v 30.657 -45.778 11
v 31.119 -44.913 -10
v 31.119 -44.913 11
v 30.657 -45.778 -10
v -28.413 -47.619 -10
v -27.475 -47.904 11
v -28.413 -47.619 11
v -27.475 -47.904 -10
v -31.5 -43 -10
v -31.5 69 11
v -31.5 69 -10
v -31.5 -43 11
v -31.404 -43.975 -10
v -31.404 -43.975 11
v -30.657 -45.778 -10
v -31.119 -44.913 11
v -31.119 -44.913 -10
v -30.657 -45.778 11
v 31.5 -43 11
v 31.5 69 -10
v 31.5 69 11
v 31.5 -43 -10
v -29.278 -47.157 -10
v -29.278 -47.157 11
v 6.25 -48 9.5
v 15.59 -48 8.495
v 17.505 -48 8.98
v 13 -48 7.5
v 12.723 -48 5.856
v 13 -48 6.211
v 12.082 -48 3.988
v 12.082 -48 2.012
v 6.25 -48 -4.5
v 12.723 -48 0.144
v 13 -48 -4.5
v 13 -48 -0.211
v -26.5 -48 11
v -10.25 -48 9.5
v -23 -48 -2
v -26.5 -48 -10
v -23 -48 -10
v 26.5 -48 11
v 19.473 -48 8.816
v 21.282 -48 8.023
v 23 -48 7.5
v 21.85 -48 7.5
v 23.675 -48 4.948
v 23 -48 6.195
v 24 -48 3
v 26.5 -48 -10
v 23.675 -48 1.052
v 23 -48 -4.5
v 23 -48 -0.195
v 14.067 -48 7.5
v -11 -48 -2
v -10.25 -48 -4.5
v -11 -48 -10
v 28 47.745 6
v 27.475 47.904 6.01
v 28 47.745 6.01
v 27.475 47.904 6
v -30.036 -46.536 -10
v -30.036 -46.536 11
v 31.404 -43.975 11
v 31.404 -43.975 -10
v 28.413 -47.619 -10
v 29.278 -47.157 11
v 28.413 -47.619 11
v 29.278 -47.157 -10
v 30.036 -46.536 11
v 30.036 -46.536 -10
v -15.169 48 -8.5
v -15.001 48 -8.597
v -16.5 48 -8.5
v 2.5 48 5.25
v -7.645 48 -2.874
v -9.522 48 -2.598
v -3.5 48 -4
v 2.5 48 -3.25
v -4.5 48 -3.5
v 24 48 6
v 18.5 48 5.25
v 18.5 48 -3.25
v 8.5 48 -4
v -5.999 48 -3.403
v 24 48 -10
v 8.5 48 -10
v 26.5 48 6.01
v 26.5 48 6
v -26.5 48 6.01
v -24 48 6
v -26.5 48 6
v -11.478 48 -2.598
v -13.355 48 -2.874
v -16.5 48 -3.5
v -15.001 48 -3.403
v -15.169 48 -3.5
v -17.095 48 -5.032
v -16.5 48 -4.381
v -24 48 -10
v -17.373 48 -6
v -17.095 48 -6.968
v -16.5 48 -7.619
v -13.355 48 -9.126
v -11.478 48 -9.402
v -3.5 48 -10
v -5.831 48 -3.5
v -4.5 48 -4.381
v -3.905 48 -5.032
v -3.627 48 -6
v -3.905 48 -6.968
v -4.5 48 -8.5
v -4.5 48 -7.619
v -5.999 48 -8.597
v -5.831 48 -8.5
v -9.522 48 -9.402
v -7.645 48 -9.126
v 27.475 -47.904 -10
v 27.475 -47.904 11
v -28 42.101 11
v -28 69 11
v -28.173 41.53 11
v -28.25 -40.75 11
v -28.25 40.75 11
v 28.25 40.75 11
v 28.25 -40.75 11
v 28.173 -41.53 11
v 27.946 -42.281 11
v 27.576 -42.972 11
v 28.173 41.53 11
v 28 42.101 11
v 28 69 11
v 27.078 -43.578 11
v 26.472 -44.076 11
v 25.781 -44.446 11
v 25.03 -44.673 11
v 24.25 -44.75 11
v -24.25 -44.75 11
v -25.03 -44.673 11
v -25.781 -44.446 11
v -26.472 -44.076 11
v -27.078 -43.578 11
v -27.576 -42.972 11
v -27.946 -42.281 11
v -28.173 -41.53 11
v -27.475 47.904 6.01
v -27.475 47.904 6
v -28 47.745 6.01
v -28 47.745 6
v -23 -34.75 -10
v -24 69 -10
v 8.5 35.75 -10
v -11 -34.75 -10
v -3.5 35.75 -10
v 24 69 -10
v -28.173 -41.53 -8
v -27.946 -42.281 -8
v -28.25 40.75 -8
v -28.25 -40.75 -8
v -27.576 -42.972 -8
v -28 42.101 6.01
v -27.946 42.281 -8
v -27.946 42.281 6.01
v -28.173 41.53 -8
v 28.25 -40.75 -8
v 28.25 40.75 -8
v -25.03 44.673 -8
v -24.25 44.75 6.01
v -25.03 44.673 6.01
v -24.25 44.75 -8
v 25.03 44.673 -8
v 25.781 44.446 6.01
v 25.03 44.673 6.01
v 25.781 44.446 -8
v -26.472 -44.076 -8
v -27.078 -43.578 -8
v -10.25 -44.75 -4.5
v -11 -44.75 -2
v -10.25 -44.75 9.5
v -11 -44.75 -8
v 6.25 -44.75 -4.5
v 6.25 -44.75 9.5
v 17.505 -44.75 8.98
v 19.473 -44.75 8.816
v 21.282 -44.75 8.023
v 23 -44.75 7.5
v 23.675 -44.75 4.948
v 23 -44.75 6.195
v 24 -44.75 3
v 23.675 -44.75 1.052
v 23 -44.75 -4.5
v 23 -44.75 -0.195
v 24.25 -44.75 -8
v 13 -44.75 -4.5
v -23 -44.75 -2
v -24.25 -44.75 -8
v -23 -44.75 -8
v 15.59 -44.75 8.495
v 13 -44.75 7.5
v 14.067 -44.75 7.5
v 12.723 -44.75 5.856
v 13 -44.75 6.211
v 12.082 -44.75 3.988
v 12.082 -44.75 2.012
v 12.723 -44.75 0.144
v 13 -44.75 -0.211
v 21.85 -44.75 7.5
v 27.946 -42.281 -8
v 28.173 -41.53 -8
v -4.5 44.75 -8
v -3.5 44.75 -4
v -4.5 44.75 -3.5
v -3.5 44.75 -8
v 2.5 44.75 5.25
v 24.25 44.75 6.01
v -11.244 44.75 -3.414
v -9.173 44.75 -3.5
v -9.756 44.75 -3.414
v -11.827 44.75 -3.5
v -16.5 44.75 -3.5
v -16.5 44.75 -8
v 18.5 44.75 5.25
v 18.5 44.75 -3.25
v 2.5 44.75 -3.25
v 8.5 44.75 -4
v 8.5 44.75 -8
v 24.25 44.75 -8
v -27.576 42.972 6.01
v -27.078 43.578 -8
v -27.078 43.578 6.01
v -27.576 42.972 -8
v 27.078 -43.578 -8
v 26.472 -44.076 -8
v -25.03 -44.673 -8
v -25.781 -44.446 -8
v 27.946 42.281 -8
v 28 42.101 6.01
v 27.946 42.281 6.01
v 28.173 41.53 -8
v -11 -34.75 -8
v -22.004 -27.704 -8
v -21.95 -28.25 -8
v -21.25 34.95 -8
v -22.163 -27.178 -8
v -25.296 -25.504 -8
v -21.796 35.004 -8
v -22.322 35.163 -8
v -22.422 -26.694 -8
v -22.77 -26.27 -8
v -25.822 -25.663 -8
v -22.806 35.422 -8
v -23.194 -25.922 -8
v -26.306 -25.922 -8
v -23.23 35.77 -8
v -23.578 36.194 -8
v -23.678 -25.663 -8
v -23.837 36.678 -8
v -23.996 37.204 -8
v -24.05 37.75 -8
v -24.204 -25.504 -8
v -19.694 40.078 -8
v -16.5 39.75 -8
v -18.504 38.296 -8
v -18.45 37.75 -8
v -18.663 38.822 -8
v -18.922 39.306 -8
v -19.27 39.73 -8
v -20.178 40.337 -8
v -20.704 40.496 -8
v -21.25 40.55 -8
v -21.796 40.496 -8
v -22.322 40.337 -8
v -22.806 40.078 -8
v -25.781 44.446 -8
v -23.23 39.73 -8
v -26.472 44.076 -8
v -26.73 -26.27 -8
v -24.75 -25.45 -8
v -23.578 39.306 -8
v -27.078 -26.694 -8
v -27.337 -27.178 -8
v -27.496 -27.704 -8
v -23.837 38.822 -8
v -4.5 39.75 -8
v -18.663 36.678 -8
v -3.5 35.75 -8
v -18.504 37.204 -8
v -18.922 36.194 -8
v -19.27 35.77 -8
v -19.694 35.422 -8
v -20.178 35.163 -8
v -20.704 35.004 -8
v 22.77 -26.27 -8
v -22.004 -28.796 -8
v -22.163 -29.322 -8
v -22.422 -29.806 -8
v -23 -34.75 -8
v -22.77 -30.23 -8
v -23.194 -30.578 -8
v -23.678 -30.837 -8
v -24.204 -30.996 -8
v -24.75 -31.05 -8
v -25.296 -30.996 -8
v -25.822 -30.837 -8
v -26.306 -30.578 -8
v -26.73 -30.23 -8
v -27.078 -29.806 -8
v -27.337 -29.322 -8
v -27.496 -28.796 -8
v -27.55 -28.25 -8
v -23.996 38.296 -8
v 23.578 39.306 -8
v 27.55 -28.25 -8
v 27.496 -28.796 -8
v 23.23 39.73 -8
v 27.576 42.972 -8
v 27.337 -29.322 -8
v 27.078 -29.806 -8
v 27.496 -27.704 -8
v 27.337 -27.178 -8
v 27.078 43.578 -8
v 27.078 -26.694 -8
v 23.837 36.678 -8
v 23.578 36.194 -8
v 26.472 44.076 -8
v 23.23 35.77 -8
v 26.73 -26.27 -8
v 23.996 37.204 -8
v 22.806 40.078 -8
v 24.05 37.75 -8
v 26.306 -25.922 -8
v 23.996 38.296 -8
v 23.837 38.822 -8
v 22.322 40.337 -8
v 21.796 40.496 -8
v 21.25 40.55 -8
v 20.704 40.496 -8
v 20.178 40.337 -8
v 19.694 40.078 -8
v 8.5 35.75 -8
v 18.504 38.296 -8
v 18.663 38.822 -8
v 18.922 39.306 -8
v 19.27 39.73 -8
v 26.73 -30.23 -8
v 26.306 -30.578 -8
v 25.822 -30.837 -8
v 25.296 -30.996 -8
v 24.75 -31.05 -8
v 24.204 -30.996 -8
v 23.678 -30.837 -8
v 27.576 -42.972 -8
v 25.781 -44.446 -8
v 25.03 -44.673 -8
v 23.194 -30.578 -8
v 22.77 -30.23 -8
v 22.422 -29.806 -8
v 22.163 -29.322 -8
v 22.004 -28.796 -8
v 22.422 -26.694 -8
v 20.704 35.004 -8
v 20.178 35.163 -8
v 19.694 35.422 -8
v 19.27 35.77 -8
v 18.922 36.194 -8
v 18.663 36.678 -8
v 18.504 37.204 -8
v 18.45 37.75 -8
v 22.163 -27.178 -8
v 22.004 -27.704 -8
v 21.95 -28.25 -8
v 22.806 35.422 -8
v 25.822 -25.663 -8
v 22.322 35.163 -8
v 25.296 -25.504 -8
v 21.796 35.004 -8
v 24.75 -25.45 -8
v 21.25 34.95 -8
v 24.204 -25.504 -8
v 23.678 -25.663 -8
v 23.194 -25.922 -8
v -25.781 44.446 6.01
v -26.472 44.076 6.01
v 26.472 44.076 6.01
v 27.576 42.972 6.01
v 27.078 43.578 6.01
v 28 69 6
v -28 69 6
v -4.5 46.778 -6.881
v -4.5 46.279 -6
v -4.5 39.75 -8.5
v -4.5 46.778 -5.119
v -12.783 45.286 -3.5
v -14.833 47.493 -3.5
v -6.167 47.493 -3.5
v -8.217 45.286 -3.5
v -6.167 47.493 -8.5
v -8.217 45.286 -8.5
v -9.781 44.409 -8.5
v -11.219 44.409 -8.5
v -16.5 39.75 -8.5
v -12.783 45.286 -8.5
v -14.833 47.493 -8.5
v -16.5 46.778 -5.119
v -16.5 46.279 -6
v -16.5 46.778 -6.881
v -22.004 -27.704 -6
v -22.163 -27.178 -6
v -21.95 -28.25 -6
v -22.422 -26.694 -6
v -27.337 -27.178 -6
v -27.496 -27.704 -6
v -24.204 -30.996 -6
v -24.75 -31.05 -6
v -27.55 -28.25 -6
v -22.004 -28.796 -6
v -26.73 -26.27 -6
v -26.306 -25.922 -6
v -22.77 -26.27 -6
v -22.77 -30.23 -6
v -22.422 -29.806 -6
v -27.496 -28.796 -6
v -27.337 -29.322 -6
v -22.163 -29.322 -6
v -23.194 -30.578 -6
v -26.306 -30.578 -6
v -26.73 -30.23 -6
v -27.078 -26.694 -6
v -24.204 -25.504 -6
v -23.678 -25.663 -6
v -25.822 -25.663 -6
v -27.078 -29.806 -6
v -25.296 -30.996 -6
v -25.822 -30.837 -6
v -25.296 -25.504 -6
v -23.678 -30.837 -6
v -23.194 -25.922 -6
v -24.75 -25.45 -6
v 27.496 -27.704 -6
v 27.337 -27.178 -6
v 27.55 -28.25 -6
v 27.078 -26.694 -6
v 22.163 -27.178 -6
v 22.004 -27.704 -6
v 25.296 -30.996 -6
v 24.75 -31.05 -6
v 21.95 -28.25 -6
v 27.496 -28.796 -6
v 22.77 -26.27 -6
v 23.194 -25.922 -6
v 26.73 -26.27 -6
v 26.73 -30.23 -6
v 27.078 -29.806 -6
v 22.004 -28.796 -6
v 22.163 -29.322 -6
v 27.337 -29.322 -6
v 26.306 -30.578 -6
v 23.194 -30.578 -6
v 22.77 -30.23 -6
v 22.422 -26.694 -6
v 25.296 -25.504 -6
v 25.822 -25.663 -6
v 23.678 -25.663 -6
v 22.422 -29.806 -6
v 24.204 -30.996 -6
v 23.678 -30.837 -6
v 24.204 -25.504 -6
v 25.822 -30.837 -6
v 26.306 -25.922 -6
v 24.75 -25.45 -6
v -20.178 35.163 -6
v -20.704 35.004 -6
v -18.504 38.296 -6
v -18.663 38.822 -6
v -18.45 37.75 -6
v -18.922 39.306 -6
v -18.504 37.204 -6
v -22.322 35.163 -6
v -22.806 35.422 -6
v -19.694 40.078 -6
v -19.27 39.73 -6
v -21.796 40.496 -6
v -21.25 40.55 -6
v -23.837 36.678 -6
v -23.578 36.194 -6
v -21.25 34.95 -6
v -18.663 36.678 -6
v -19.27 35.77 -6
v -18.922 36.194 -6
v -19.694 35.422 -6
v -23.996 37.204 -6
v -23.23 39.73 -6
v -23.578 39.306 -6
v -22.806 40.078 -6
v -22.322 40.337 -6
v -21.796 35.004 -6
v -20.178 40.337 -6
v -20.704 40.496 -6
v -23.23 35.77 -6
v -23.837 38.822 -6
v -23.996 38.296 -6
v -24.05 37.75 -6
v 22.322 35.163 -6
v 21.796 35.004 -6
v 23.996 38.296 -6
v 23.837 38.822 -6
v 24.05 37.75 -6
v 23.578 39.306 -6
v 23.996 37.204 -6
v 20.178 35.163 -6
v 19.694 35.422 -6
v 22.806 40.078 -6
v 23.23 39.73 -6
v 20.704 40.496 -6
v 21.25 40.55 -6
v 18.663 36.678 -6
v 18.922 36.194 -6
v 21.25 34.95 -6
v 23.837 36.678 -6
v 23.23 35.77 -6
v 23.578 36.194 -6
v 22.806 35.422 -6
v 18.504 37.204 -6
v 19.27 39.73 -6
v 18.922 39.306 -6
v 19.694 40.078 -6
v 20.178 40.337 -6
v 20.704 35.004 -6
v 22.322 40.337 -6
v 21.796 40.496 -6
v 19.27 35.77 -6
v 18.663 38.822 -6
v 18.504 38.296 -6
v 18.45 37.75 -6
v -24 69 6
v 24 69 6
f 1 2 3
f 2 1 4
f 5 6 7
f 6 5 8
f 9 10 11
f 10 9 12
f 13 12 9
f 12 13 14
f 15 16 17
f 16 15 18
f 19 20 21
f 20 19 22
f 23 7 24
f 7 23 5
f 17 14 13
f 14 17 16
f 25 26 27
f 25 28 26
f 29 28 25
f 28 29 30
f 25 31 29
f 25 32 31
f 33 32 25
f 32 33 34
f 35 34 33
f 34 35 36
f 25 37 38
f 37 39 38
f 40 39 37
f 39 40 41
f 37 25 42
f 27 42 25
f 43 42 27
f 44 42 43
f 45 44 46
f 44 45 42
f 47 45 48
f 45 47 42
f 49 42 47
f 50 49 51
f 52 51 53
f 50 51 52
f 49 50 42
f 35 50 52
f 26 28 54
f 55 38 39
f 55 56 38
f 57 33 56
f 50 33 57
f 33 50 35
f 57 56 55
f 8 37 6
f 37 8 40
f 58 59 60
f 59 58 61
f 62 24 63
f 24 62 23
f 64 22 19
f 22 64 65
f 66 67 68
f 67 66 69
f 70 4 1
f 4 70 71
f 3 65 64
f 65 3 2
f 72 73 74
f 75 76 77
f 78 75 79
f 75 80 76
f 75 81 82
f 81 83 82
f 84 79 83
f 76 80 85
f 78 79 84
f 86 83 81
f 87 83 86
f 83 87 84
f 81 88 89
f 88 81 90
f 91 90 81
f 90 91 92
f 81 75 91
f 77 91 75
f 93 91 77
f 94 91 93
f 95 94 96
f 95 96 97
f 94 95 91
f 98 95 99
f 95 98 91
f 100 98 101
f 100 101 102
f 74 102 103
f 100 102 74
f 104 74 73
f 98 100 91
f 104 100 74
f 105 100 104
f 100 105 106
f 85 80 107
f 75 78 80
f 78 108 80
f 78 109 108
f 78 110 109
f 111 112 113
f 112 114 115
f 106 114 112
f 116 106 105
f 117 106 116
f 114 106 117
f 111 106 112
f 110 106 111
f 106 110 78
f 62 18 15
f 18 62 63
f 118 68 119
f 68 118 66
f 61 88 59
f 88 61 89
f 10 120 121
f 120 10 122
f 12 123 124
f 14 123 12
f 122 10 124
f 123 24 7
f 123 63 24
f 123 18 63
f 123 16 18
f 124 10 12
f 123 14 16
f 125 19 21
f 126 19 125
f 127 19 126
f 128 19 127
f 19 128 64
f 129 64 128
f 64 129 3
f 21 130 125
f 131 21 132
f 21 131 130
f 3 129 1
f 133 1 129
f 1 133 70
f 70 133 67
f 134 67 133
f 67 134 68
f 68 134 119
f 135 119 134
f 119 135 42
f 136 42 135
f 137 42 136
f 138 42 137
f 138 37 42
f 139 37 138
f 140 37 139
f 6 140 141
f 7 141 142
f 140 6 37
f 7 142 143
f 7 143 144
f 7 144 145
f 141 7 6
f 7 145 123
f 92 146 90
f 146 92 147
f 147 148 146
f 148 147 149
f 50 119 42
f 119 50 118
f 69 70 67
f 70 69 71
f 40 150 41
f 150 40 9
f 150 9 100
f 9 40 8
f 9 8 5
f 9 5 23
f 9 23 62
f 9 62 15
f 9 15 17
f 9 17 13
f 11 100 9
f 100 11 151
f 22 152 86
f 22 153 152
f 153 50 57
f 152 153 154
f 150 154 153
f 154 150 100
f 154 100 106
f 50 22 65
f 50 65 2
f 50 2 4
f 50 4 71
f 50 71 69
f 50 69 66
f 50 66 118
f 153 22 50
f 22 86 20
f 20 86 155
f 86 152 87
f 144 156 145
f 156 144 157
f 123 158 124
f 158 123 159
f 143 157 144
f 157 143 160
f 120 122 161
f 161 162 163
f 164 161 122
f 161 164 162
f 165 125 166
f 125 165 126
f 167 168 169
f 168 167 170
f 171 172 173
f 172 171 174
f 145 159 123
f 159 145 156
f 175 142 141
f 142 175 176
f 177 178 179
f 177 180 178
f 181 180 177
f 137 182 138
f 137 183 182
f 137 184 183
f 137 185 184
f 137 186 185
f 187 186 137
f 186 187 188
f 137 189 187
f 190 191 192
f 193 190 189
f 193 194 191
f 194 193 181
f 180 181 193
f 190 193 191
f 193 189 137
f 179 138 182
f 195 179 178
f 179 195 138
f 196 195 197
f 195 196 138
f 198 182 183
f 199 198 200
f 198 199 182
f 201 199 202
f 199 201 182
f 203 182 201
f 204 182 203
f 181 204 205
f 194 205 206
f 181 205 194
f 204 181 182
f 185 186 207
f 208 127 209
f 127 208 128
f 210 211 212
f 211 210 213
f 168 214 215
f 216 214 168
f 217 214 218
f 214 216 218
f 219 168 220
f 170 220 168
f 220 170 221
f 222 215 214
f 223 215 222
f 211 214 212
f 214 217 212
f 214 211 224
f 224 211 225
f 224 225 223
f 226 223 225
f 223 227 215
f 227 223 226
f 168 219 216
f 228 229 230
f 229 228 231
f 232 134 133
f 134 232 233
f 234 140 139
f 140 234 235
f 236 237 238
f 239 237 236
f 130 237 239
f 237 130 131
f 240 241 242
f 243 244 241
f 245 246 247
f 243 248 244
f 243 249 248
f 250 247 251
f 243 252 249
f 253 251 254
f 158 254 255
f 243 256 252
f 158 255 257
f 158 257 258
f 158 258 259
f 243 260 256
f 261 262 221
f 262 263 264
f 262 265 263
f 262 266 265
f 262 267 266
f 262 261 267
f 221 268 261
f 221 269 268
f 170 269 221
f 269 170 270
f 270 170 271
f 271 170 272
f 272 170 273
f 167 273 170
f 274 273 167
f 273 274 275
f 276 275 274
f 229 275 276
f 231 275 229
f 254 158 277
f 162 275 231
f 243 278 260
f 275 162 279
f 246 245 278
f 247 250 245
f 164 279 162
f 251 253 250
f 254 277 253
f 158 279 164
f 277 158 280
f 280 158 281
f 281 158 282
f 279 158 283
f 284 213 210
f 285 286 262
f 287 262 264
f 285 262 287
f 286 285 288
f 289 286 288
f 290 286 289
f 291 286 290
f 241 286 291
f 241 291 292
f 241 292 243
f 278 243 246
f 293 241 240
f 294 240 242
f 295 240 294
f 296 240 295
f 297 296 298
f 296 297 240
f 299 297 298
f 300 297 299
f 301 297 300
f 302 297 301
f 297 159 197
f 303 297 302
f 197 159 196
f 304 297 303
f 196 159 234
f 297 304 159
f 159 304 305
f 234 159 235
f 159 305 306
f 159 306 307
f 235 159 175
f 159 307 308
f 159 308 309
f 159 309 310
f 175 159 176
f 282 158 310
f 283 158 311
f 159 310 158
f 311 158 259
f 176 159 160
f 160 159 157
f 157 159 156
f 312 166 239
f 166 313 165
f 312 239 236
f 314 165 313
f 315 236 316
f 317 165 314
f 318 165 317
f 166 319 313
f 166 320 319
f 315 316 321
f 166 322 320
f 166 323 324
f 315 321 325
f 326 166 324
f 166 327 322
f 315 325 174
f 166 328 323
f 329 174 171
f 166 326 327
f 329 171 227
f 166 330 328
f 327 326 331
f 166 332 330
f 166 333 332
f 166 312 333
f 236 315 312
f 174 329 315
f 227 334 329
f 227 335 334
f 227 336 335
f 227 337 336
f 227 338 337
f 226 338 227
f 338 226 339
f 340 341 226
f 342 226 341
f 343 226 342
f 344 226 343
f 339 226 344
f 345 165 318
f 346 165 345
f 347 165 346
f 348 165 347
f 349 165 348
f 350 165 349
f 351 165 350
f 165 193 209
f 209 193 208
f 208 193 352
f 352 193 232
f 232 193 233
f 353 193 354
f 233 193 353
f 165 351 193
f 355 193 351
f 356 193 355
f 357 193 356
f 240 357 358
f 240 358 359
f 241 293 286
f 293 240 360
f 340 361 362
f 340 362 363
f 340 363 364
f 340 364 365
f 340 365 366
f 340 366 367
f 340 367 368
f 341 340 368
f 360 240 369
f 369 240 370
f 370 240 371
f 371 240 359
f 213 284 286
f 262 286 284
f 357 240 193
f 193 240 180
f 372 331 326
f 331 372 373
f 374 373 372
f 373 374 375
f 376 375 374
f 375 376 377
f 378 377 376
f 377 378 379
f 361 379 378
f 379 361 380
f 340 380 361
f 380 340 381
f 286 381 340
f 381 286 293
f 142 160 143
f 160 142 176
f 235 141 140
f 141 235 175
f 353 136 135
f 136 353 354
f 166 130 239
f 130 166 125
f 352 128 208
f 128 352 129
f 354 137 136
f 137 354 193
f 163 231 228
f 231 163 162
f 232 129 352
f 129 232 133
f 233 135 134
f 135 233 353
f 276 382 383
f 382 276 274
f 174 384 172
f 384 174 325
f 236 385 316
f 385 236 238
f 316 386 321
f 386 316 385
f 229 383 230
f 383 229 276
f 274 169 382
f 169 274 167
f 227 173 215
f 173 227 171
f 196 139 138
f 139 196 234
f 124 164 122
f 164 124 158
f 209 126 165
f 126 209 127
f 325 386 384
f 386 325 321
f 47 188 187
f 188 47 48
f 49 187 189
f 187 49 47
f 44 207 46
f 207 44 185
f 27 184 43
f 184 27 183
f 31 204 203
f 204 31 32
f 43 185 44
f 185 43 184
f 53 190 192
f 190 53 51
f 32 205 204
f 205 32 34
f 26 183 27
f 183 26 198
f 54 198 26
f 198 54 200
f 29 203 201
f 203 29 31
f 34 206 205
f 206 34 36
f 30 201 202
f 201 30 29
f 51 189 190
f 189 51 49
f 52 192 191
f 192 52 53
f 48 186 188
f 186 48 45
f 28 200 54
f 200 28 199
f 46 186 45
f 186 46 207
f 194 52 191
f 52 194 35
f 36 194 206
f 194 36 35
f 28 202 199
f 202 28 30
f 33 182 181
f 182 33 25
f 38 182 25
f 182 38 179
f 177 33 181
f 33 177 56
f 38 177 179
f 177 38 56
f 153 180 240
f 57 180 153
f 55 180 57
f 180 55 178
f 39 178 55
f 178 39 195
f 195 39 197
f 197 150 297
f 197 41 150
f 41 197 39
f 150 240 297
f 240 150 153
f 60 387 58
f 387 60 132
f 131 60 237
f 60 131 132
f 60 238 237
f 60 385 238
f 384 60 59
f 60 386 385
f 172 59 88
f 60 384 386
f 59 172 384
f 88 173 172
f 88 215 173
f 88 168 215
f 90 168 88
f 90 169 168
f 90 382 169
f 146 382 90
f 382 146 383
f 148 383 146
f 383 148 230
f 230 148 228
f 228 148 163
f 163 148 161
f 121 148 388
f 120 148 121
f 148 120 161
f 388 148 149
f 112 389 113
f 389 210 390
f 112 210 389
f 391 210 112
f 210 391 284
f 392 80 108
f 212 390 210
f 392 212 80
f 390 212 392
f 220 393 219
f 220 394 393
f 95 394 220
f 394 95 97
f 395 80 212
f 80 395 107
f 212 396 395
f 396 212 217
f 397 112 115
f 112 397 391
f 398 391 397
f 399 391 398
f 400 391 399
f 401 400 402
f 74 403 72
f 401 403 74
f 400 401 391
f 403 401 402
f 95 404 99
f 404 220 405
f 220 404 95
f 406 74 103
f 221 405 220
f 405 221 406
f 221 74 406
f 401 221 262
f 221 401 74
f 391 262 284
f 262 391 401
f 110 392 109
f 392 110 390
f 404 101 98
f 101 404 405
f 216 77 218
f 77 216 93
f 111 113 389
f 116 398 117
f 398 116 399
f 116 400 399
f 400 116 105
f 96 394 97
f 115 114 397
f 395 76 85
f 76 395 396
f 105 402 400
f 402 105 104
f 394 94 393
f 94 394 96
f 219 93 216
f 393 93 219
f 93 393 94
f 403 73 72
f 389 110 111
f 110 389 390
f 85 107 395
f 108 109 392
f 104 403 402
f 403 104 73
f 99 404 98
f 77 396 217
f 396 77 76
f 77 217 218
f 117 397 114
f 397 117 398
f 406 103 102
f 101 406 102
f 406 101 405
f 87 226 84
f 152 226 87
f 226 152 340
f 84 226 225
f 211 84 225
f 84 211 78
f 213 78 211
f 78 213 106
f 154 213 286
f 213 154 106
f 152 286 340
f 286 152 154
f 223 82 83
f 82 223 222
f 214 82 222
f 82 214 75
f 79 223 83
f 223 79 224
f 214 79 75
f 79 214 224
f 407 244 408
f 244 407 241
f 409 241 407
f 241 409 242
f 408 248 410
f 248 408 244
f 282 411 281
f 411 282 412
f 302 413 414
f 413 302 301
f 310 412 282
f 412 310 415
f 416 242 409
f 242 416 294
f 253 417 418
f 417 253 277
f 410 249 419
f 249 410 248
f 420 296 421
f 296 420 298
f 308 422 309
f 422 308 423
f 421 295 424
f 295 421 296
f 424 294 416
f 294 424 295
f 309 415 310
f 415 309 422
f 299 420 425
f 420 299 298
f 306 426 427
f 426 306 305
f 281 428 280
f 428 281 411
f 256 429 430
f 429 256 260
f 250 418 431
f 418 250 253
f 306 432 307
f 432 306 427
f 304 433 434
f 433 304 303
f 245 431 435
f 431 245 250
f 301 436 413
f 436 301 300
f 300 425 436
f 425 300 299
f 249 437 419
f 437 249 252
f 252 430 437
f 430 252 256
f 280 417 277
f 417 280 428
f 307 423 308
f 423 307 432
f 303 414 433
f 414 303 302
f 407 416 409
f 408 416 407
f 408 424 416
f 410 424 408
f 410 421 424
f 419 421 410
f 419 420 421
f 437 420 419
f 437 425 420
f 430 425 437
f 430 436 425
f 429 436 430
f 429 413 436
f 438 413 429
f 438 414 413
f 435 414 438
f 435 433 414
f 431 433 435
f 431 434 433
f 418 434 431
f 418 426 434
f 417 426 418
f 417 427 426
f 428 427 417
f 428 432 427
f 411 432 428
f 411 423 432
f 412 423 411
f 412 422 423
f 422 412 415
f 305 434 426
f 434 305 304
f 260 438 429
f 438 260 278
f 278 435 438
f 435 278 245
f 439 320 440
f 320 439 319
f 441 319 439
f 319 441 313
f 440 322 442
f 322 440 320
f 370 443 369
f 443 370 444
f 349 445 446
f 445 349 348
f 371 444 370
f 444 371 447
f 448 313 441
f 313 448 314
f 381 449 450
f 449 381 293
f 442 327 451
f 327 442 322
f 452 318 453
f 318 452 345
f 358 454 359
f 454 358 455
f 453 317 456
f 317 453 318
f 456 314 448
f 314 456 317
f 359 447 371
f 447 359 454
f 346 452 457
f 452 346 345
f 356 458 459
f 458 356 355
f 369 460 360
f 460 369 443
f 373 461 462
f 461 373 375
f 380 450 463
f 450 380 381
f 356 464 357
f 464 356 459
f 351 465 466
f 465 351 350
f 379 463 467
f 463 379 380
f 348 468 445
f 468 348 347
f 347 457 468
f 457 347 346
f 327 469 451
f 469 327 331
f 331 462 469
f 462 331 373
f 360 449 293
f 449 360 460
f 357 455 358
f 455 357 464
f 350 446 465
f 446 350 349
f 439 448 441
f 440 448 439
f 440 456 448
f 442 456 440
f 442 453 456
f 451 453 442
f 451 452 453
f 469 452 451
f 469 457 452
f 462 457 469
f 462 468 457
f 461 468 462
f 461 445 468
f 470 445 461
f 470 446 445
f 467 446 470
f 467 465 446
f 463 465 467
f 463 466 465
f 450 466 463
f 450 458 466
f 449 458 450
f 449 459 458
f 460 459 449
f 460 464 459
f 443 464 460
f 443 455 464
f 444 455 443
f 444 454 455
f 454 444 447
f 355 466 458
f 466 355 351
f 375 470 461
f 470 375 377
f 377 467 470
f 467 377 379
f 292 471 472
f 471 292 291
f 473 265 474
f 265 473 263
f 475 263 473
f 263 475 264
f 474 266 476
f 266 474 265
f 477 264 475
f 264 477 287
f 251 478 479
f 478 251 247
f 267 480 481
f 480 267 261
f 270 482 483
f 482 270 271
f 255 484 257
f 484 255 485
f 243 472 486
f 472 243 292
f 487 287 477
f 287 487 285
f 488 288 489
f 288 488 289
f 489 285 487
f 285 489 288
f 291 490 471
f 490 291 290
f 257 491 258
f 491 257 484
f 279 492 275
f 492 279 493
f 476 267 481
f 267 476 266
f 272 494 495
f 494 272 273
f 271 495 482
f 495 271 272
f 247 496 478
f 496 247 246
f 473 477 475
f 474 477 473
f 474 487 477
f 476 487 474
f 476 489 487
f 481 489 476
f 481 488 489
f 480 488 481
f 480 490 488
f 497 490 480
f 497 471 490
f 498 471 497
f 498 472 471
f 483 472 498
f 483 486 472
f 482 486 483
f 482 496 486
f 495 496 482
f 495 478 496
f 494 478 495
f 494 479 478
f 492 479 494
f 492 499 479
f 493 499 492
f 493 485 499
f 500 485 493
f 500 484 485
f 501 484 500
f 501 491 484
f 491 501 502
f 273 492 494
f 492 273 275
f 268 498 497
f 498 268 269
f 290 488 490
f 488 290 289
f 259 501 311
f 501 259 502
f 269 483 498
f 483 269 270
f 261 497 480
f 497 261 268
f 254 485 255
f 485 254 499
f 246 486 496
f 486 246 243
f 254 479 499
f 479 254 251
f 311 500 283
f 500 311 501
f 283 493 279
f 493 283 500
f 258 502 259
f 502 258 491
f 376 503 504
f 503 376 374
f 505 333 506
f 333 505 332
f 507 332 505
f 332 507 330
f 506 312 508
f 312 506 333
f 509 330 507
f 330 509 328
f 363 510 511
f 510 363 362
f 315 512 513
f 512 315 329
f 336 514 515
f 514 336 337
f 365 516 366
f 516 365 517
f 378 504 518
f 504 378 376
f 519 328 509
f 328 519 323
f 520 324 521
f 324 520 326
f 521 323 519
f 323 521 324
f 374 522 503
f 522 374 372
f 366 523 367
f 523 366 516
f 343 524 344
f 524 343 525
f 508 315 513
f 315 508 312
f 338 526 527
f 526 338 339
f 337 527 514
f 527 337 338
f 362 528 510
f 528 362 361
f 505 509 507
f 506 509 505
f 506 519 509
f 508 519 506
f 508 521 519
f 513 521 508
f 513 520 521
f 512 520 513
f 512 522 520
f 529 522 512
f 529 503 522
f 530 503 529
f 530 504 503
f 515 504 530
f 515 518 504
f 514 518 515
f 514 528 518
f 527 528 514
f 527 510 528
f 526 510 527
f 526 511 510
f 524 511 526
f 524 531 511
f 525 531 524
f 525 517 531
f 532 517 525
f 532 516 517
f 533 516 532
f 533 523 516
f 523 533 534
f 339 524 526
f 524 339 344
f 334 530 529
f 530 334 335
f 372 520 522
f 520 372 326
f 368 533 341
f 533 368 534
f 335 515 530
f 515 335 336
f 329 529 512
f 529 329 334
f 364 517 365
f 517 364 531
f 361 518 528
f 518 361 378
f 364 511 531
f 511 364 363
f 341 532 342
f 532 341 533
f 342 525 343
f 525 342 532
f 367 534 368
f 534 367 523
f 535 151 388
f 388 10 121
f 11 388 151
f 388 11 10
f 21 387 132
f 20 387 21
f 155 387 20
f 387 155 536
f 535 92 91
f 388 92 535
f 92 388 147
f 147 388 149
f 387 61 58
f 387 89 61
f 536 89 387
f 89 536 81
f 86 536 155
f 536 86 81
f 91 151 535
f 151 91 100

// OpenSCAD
wall_thickness=6.5;
base_thickness=2.0;
bb_depth=20;
bb_width=56.5;
bb_height=89.5;
bb_curve_corner=10;

peg_pow_front=16.5;
peg_pow_side=3.5;

peg_sd_front=7;
peg_sd_side=7;

peg_outer_radius=2.8;
peg_inner_radius=2.0;

module RoundedBB(extra_width,extra_height,depth,curve=bb_curve_corner) {
     minkowski() {
          cube([bb_width-curve+extra_width,bb_height-curve+extra_height,depth],center=true);
          cylinder(r=curve/2, height=depth, $fn=32);
     }
   //  translate([0,55+2.5,0.5])
   //   cube([bb_width+wall_thickness,23,bb_depth+1],center=true);
}

module BeagleBox(curve=bb_curve_corner) {
     difference() {
          RoundedBB(wall_thickness, wall_thickness, bb_depth, curve);
          translate([0,0,base_thickness])
               RoundedBB(0, 0, bb_depth, curve-2);
     }
}

difference() {
     union() {

          difference() {

               BeagleBox();

               translate([0,0,-bb_depth/2+9]) {
                    // -- Bottom End --

                    // Power connector
                    %				translate([18,-bb_height/2,2.5])
                         cube([10,10,12],center=true);
                    translate( [18,-45,4] )
                         rotate( [90,0,0] )
                         cylinder( r=6, h=9, center=true );
                    translate([18,-bb_height/2,2.5])
                         cube([10,10,12],center=true);
                    // Ethernet port
                    translate([-2,-bb_height/2,3.5])
                         cube([16.5,10,14],center=true);

                    // Mini USB (Underneath)
                    // translate([-23,-bb_height/2-5,-16])     // protruding
                    // translate([-23,-bb_height/2,-9+0.334])  // thin layer underneath
                    //	cube([10,12,base_thickness-0.3333]);
                    translate([-23,-bb_height/2-10,-10])
                         cube([12,20,9]);
                    // original mini USB, doesn't fit cable
                    %				translate([-22,-bb_height/2-10,-12])
                                         cube([10,20,8]);

                    // -- Top reduction Damian--
                    translate([-56/2,35,8.01-1])
                            cube([56,20,17-12]);



                    // SD Card slot
                    translate([-6.5-4,bb_height/2,-5.0])
                         cube([12,10,5], center=true); // was 3 in z
                    // Original SD slot
                    %				translate([-6.5,bb_height/2,-5.5])
                                         cube([12,10,2], center=true);
                    // thumb depression for inserting card
                    translate([-6.5-4,bb_height/2+3.5,-5.0])
                         scale( [1,2.3,0.5] )
                         rotate( [90,0,0] )
                         cylinder( r1=7, r2=0, h=6 );
                    // HDMI port
                    translate([-6.5+3.0,bb_height/2-9,-12.0])
                         cube([12,20,9]);
                    // USB port
                    translate([10.5,bb_height/2,2.0])
                         cube([16,10,8.5],center=true);
               }
          }

          // Pegs
          translate([0,0,-bb_depth/2+9]) {
               // Pegs on "power" end
               translate([-bb_width/2+peg_pow_side,-bb_height/2+peg_pow_front,-6])
                    cylinder(r=peg_outer_radius,h=2,$fn=32,center=true);
               translate([bb_width/2-peg_pow_side,-bb_height/2+peg_pow_front,-6])
                    cylinder(r=peg_outer_radius,h=2,$fn=32,center=true);

               // Pegs on "sd card" end
               translate([-bb_width/2+peg_sd_side,bb_height/2-peg_sd_front,-6])
                    cylinder(r=peg_outer_radius,h=2,$fn=32,center=true);
               translate([bb_width/2-peg_sd_side,bb_height/2-peg_sd_front,-6])
                    cylinder(r=peg_outer_radius,h=2,$fn=32,center=true);
          }
     }

     // Drill holes through pegs and floor
//	translate([0,0,-bb_depth/2+9]) {
     // Pegs on "power" end
//		translate([-bb_width/2+peg_pow_side,-bb_height/2+peg_pow_front,-5])
//			cylinder(r=peg_inner_radius,h=10,$fn=32,center=true);
//		translate([bb_width/2-peg_pow_side,-bb_height/2+peg_pow_front,-5])
//			cylinder(r=peg_inner_radius,h=10,$fn=32,center=true);

     // Pegs on "sd card" end
//		translate([-bb_width/2+peg_sd_side,bb_height/2-peg_sd_front,-5])
//			cylinder(r=peg_inner_radius,h=10,$fn=32,center=true);
//		translate([bb_width/2-peg_sd_side,bb_height/2-peg_sd_front,-5])
//			cylinder(r=peg_inner_radius,h=10,$fn=32,center=true);
//	}
}



difference(){
     union(){
          translate([0,55+2.5,0.5])
               cube([bb_width+wall_thickness,23,bb_depth+1],center=true);

          // correcion de las paredes
          translate([bb_width/2+wall_thickness/2-1.5,40,0.5])
               cube([3,23,bb_depth+1],center=true);

          translate([-bb_width/2-wall_thickness/2+1.5,40,0.5])
               cube([3,23,bb_depth+1],center=true);
     }

     union(){
          // -- Top reduction Damian--
          translate([-56/2,35,6])
               cube([56,200,17]);

          translate([-48/2,35,-11])
               cube([48,200,130]);
     }}
